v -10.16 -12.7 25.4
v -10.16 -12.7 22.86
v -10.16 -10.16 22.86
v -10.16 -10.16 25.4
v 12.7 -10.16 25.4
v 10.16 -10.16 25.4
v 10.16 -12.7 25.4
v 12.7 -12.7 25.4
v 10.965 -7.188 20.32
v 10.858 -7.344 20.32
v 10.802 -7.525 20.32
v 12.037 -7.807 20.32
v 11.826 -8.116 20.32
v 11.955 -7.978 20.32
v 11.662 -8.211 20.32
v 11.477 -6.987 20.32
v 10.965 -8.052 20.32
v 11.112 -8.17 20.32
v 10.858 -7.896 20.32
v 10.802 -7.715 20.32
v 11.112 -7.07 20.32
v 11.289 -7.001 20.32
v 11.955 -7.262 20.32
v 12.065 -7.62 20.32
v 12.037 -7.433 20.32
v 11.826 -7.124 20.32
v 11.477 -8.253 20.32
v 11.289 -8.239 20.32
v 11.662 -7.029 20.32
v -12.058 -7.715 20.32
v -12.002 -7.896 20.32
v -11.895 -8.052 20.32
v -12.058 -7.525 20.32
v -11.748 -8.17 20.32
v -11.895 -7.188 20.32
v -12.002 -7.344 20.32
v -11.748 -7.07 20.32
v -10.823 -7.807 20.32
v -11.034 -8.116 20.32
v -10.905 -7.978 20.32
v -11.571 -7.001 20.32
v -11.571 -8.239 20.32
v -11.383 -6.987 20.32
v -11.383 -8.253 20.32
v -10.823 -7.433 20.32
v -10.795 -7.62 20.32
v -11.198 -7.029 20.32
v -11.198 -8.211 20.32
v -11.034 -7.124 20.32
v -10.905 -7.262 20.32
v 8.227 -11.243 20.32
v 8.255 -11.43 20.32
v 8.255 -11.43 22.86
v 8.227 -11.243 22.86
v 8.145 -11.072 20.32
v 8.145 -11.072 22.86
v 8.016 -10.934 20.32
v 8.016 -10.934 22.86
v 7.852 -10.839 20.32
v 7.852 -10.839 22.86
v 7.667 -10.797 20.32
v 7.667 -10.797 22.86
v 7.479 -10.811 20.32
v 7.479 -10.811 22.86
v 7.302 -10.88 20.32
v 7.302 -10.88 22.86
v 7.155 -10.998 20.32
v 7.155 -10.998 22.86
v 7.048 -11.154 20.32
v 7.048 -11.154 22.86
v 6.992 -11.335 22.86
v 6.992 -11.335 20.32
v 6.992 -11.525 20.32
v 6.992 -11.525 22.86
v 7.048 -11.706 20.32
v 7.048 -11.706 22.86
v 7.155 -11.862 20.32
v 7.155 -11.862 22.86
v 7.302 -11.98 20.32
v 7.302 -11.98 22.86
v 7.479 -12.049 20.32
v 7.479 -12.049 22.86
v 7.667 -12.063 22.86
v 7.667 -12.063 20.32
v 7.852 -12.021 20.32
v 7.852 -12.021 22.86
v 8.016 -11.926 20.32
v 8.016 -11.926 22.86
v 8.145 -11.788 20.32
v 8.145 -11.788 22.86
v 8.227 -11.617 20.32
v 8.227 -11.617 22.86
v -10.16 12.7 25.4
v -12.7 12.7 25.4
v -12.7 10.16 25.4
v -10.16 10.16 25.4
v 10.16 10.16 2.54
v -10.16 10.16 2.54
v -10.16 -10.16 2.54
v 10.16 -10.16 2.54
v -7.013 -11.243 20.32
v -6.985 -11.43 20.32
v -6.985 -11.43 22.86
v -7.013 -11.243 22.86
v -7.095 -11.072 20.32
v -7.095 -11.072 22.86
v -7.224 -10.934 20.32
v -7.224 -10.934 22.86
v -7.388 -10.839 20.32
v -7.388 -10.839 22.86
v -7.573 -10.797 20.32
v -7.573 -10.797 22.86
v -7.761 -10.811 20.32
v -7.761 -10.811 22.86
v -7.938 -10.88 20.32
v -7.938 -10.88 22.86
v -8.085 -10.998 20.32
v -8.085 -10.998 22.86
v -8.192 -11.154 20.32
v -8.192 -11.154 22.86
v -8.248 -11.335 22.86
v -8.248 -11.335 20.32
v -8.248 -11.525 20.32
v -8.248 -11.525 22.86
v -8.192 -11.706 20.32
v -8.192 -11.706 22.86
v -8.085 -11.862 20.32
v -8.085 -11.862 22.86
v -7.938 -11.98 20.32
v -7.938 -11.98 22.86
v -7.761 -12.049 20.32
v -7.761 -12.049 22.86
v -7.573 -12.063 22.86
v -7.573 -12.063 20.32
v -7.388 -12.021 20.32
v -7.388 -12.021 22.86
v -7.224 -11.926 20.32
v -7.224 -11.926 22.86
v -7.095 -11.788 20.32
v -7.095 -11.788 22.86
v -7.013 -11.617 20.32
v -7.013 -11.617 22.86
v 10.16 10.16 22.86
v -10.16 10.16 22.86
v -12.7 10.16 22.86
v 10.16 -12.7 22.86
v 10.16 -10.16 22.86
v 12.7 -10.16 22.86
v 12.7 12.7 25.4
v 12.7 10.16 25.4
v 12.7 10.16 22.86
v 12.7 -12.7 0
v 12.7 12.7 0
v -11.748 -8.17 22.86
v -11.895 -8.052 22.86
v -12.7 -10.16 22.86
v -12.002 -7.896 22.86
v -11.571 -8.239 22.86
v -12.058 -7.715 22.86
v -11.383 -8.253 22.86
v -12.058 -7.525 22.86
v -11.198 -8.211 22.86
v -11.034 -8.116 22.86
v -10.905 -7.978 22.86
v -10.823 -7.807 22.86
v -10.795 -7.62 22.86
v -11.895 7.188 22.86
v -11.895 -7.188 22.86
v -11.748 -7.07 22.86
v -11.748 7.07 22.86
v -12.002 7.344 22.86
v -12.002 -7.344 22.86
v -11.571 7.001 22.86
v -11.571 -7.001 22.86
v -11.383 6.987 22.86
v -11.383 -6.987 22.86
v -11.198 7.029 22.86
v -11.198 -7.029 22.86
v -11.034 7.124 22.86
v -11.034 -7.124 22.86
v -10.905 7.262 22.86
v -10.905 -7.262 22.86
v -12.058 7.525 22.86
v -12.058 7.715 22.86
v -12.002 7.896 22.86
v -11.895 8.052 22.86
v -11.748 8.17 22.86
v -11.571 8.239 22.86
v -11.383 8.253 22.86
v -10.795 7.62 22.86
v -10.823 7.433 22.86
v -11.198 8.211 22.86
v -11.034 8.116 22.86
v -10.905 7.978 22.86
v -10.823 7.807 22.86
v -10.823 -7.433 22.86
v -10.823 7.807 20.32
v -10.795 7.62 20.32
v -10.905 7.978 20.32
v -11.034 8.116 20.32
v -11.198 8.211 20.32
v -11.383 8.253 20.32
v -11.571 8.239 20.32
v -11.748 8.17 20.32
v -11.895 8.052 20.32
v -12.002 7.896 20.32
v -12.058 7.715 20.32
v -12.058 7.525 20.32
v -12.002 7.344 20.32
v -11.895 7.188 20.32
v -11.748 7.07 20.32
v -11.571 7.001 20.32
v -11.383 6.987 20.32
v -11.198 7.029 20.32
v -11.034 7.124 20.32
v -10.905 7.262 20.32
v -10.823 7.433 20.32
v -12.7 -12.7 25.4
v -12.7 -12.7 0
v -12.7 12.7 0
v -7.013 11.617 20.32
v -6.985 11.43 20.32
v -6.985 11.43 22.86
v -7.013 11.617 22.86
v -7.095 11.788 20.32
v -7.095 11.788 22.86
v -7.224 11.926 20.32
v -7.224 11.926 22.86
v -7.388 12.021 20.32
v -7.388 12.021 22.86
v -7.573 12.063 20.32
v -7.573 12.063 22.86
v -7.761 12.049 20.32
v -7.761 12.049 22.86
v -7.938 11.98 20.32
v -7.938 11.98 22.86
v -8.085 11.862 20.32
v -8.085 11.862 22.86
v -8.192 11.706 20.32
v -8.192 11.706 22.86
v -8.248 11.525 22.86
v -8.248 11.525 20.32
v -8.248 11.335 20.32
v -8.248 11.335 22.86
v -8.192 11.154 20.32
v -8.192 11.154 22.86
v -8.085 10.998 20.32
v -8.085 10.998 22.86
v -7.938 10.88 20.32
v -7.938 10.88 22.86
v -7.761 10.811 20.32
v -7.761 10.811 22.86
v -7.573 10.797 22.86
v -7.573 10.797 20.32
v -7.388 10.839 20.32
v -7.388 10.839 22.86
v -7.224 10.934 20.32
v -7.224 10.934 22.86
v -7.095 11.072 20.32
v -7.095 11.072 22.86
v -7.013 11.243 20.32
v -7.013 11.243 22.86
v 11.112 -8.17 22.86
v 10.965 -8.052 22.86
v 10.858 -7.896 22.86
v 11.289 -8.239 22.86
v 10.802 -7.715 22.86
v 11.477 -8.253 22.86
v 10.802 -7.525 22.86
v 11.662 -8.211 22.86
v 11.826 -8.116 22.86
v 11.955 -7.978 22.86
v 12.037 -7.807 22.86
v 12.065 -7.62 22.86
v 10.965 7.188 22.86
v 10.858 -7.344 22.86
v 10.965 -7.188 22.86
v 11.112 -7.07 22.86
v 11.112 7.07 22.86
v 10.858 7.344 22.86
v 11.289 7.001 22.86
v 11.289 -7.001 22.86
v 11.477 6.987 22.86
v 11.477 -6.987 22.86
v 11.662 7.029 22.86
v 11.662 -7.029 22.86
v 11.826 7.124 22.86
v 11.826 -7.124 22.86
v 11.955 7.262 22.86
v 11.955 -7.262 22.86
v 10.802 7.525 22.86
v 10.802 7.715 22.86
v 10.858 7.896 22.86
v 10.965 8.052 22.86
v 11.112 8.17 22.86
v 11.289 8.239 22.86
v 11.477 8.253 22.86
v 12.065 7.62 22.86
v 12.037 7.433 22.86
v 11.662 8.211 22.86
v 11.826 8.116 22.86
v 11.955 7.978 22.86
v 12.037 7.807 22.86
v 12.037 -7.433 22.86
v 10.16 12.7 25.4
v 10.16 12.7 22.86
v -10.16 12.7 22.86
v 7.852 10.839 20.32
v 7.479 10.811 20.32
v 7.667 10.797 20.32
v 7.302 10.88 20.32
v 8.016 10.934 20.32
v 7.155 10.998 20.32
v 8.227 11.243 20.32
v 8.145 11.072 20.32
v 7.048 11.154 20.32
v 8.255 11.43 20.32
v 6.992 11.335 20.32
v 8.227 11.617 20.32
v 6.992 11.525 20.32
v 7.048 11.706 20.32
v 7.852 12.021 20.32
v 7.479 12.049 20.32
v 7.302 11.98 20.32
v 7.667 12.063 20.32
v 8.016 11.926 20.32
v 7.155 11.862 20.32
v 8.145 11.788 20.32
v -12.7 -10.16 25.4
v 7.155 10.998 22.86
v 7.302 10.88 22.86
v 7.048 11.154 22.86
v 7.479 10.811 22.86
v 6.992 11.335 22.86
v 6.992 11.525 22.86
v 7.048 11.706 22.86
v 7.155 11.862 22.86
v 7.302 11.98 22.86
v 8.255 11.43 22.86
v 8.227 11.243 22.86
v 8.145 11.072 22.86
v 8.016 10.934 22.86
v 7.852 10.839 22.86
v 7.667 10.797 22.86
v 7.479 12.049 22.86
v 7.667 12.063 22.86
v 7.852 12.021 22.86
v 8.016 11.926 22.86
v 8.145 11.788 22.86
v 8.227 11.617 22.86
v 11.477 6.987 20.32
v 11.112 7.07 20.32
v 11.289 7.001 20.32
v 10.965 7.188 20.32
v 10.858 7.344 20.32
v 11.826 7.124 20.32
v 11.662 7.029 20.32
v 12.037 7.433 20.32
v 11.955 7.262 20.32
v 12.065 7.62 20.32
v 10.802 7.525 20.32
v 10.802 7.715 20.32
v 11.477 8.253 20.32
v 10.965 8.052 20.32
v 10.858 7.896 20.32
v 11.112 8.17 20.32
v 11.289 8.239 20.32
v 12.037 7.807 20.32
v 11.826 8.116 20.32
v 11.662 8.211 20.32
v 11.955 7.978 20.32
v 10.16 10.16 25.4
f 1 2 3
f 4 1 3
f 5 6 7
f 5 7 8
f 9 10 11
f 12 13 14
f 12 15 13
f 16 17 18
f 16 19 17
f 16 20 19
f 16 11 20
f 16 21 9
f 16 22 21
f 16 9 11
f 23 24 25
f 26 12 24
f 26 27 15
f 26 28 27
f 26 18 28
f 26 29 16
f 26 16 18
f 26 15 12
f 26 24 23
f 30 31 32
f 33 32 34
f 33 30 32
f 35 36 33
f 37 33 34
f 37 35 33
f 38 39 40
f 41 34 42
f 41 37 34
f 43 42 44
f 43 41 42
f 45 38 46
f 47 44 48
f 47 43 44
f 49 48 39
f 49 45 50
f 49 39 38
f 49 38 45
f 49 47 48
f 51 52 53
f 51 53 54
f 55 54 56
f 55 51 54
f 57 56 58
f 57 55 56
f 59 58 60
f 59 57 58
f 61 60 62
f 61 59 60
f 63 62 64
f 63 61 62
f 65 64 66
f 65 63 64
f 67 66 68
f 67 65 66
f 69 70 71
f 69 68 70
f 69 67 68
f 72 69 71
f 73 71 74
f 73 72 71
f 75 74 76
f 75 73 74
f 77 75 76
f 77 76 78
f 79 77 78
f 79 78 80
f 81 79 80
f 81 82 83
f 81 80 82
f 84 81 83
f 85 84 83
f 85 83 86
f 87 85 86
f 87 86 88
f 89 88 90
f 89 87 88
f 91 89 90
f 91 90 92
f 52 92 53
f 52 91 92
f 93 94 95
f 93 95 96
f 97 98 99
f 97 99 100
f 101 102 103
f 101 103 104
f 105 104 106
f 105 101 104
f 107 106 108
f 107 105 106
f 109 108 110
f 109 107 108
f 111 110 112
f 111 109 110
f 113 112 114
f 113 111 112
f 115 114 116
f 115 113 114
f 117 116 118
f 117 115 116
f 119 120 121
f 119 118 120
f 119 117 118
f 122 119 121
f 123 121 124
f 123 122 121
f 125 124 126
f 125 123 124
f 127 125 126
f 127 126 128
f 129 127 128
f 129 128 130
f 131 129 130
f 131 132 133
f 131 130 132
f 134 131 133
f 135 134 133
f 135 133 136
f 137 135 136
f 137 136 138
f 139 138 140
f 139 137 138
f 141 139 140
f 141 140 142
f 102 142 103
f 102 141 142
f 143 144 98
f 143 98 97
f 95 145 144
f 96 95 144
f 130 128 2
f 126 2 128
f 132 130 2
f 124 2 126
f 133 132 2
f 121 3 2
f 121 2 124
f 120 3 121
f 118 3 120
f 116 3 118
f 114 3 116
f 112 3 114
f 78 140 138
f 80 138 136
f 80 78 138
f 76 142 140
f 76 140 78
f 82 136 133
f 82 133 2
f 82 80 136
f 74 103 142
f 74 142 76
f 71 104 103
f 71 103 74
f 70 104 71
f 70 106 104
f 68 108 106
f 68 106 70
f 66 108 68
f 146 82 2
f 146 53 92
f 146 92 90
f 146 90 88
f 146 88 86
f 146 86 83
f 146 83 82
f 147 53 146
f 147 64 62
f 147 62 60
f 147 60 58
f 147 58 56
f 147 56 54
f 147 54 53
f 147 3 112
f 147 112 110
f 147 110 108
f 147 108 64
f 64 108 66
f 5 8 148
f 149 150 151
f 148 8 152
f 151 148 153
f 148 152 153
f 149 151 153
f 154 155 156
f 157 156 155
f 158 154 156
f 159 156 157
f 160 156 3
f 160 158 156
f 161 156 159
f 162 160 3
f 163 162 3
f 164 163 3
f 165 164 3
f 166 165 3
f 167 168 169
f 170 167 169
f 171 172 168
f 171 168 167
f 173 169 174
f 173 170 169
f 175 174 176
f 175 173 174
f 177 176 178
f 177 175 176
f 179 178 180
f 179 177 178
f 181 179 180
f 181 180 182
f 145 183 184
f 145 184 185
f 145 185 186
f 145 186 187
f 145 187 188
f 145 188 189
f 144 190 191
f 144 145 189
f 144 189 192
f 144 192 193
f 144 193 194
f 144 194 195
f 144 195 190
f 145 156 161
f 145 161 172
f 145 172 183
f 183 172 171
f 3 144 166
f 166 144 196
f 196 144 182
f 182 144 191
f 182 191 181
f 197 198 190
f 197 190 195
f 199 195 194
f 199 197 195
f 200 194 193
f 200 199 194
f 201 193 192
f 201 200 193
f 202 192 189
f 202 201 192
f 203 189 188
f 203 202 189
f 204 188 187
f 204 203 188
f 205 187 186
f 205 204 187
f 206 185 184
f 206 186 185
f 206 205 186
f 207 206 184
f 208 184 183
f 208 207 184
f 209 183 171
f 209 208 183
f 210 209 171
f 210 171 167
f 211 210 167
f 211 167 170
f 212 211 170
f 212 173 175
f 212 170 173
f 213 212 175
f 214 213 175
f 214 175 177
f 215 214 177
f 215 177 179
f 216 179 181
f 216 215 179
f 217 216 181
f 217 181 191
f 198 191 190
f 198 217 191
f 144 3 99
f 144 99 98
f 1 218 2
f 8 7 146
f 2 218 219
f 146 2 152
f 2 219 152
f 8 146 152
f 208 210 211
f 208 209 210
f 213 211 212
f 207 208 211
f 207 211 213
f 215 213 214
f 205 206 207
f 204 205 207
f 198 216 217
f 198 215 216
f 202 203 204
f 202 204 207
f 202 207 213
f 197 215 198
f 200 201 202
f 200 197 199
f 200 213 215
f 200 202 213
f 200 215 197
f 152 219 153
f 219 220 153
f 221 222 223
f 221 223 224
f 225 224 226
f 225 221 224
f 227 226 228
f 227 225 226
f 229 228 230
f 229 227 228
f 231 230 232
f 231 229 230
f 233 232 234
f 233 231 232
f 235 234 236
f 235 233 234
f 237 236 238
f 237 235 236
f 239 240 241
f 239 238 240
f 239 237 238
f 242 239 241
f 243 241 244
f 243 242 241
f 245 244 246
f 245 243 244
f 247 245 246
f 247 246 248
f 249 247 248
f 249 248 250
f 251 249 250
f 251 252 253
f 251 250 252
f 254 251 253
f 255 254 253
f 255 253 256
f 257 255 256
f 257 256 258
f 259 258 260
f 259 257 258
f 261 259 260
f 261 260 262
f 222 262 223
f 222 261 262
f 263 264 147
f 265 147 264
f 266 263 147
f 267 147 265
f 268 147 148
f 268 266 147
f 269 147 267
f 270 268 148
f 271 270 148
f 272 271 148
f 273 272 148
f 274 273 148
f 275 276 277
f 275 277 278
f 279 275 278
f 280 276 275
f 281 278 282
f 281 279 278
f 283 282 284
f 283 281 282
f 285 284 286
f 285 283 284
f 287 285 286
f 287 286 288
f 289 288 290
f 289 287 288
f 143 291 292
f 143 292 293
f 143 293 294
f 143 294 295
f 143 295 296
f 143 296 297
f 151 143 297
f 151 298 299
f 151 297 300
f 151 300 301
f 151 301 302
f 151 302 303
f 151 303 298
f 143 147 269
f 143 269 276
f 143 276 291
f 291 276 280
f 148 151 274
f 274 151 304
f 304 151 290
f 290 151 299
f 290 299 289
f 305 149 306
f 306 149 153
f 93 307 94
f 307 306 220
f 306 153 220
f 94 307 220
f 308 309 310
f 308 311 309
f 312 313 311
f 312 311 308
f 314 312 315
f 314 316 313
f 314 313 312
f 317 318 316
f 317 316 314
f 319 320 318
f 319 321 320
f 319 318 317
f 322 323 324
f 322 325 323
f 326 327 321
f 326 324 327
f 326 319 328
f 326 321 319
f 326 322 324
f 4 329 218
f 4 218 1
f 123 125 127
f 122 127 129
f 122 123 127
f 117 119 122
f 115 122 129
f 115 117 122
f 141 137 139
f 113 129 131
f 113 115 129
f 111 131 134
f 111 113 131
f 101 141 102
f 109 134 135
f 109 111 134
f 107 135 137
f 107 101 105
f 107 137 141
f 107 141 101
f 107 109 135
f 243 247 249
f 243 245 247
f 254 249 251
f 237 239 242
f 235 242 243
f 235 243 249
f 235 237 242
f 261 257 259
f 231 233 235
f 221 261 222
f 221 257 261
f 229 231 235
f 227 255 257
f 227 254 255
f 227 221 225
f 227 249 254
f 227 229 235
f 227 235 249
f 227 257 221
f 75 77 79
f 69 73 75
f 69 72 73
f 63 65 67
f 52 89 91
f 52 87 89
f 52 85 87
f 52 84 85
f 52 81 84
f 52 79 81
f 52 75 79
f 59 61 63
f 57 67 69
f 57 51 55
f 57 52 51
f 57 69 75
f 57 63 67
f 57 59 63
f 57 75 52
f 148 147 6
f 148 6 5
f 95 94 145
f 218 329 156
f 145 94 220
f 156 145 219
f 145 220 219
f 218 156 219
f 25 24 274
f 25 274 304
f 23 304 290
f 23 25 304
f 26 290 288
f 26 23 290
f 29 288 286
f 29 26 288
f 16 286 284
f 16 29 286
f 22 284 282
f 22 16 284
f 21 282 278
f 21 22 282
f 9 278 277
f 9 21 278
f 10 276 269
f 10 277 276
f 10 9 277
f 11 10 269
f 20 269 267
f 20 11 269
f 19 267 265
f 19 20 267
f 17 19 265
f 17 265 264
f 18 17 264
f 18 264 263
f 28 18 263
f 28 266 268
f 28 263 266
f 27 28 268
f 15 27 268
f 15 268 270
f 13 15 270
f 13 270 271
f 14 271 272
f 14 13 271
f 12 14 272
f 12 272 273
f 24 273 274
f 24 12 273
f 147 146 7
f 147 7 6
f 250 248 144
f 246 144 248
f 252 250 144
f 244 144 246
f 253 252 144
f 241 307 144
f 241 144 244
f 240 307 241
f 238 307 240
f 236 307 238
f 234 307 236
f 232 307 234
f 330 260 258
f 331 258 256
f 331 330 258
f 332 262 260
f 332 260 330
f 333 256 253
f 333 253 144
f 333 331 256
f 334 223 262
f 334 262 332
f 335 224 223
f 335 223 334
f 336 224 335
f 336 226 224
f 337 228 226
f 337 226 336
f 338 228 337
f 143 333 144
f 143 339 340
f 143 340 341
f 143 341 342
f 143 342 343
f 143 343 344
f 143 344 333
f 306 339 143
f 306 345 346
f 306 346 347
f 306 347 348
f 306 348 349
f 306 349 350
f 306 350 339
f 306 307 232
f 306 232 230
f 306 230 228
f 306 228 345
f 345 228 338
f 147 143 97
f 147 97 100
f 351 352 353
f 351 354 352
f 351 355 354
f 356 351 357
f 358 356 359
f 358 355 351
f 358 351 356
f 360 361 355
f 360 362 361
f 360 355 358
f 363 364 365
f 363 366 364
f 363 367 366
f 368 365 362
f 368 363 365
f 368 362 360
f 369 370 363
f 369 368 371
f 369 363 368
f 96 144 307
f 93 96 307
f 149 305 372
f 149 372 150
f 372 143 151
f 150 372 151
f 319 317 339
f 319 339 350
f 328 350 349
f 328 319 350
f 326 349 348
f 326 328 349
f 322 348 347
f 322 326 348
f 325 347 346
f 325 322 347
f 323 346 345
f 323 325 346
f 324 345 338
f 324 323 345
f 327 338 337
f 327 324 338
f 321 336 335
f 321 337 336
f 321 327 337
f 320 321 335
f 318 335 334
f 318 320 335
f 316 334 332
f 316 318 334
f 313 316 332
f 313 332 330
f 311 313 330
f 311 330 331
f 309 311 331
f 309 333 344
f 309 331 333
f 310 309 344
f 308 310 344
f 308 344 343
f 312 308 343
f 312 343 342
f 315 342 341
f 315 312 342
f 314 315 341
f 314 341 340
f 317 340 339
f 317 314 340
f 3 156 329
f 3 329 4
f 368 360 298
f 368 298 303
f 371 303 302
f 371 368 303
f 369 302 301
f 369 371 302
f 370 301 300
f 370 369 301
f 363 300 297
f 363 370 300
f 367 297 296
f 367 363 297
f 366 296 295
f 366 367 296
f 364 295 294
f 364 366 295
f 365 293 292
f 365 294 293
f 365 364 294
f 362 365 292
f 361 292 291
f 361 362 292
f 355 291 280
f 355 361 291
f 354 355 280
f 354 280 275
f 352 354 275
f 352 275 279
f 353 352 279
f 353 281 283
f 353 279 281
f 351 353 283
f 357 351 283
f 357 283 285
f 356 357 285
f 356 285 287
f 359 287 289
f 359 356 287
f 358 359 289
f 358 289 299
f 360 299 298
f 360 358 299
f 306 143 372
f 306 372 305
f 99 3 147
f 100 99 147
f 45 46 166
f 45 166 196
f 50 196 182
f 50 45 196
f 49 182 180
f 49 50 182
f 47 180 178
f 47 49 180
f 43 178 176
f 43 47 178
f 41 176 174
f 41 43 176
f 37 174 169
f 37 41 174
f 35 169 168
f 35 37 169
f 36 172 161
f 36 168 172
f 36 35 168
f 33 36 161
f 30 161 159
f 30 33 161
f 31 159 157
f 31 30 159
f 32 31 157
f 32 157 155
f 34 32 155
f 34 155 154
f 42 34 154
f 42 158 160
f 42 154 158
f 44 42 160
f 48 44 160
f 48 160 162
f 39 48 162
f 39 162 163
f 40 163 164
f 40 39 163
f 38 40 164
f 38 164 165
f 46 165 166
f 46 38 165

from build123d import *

# Parameters (mm, degrees)
F0_W     = 20.32
F0_H     = 20.32
F1_DEPTH = 2.54
F0_W_2   = 2.54
F0_H_2   = 2.54
F2_DEPTH = 22.86
F3_DEPTH = 25.4
F4_R     = 0.635
F5_DEPTH = 25.4
F6_DEPTH = 20.32


with BuildPart() as f1:
    # F0 (on Top) → F1 (new body)
    with BuildSketch(Plane.XY):
        Rectangle(F0_W, F0_H)
    extrude(amount=F1_DEPTH)

    # F0 (on Top) → F2 (join)
    with BuildSketch(Plane.XY):
        with Locations((-11.43, 0)):
            Rectangle(F0_W_2, F0_H)
        with Locations((-11.43, 11.43)):
            Rectangle(F0_W_2, F0_H_2)
        with Locations((0, 11.43)):
            Rectangle(F0_W, F0_H_2)
        with Locations((11.43, 11.43)):
            Rectangle(F0_W_2, F0_H_2)
        with Locations((11.43, 0)):
            Rectangle(F0_W_2, F0_H)
        with Locations((11.43, -11.43)):
            Rectangle(F0_W_2, F0_H_2)
        with Locations((0, -11.43)):
            Rectangle(F0_W, F0_H_2)
        with Locations((-11.43, -11.43)):
            Rectangle(F0_W_2, F0_H_2)
    extrude(amount=F2_DEPTH)

    # F0 (on Top) → F3 (join)
    with BuildSketch(Plane.XY):
        with Locations((-11.43, -11.43)):
            Rectangle(F0_W_2, F0_H_2)
        with Locations((11.43, -11.43)):
            Rectangle(F0_W_2, F0_H_2)
        with Locations((11.43, 11.43)):
            Rectangle(F0_W_2, F0_H_2)
        with Locations((-11.43, 11.43)):
            Rectangle(F0_W_2, F0_H_2)
    extrude(amount=F3_DEPTH)

    # F4 (on Top) → F5 (cut)
    with BuildSketch(Plane.XY):
        with Locations((-7.62, -11.43)):
            Circle(F4_R)
        with Locations((7.62, -11.43)):
            Circle(F4_R)
        with Locations((11.43, -7.62)):
            Circle(F4_R)
        with Locations((11.43, 7.62)):
            Circle(F4_R)
        with Locations((7.62, 11.43)):
            Circle(F4_R)
        with Locations((-7.62, 11.43)):
            Circle(F4_R)
        with Locations((-11.43, 7.62)):
            Circle(F4_R)
        with Locations((-11.43, -7.62)):
            Circle(F4_R)
    extrude(amount=F5_DEPTH, mode=Mode.SUBTRACT)

    # F0 (on Top) → F6 (join)
    with BuildSketch(Plane.XY):
        with Locations((11.43, -11.43)):
            Rectangle(F0_W_2, F0_H_2)
        with Locations((0, -11.43)):
            Rectangle(F0_W, F0_H_2)
        with Locations((11.43, 0)):
            Rectangle(F0_W_2, F0_H)
        with Locations((-11.43, -11.43)):
            Rectangle(F0_W_2, F0_H_2)
        with Locations((11.43, 11.43)):
            Rectangle(F0_W_2, F0_H_2)
        with Locations((-11.43, 0)):
            Rectangle(F0_W_2, F0_H)
        with Locations((0, 11.43)):
            Rectangle(F0_W, F0_H_2)
        with Locations((-11.43, 11.43)):
            Rectangle(F0_W_2, F0_H_2)
    extrude(amount=F6_DEPTH)


solid = f1.part
